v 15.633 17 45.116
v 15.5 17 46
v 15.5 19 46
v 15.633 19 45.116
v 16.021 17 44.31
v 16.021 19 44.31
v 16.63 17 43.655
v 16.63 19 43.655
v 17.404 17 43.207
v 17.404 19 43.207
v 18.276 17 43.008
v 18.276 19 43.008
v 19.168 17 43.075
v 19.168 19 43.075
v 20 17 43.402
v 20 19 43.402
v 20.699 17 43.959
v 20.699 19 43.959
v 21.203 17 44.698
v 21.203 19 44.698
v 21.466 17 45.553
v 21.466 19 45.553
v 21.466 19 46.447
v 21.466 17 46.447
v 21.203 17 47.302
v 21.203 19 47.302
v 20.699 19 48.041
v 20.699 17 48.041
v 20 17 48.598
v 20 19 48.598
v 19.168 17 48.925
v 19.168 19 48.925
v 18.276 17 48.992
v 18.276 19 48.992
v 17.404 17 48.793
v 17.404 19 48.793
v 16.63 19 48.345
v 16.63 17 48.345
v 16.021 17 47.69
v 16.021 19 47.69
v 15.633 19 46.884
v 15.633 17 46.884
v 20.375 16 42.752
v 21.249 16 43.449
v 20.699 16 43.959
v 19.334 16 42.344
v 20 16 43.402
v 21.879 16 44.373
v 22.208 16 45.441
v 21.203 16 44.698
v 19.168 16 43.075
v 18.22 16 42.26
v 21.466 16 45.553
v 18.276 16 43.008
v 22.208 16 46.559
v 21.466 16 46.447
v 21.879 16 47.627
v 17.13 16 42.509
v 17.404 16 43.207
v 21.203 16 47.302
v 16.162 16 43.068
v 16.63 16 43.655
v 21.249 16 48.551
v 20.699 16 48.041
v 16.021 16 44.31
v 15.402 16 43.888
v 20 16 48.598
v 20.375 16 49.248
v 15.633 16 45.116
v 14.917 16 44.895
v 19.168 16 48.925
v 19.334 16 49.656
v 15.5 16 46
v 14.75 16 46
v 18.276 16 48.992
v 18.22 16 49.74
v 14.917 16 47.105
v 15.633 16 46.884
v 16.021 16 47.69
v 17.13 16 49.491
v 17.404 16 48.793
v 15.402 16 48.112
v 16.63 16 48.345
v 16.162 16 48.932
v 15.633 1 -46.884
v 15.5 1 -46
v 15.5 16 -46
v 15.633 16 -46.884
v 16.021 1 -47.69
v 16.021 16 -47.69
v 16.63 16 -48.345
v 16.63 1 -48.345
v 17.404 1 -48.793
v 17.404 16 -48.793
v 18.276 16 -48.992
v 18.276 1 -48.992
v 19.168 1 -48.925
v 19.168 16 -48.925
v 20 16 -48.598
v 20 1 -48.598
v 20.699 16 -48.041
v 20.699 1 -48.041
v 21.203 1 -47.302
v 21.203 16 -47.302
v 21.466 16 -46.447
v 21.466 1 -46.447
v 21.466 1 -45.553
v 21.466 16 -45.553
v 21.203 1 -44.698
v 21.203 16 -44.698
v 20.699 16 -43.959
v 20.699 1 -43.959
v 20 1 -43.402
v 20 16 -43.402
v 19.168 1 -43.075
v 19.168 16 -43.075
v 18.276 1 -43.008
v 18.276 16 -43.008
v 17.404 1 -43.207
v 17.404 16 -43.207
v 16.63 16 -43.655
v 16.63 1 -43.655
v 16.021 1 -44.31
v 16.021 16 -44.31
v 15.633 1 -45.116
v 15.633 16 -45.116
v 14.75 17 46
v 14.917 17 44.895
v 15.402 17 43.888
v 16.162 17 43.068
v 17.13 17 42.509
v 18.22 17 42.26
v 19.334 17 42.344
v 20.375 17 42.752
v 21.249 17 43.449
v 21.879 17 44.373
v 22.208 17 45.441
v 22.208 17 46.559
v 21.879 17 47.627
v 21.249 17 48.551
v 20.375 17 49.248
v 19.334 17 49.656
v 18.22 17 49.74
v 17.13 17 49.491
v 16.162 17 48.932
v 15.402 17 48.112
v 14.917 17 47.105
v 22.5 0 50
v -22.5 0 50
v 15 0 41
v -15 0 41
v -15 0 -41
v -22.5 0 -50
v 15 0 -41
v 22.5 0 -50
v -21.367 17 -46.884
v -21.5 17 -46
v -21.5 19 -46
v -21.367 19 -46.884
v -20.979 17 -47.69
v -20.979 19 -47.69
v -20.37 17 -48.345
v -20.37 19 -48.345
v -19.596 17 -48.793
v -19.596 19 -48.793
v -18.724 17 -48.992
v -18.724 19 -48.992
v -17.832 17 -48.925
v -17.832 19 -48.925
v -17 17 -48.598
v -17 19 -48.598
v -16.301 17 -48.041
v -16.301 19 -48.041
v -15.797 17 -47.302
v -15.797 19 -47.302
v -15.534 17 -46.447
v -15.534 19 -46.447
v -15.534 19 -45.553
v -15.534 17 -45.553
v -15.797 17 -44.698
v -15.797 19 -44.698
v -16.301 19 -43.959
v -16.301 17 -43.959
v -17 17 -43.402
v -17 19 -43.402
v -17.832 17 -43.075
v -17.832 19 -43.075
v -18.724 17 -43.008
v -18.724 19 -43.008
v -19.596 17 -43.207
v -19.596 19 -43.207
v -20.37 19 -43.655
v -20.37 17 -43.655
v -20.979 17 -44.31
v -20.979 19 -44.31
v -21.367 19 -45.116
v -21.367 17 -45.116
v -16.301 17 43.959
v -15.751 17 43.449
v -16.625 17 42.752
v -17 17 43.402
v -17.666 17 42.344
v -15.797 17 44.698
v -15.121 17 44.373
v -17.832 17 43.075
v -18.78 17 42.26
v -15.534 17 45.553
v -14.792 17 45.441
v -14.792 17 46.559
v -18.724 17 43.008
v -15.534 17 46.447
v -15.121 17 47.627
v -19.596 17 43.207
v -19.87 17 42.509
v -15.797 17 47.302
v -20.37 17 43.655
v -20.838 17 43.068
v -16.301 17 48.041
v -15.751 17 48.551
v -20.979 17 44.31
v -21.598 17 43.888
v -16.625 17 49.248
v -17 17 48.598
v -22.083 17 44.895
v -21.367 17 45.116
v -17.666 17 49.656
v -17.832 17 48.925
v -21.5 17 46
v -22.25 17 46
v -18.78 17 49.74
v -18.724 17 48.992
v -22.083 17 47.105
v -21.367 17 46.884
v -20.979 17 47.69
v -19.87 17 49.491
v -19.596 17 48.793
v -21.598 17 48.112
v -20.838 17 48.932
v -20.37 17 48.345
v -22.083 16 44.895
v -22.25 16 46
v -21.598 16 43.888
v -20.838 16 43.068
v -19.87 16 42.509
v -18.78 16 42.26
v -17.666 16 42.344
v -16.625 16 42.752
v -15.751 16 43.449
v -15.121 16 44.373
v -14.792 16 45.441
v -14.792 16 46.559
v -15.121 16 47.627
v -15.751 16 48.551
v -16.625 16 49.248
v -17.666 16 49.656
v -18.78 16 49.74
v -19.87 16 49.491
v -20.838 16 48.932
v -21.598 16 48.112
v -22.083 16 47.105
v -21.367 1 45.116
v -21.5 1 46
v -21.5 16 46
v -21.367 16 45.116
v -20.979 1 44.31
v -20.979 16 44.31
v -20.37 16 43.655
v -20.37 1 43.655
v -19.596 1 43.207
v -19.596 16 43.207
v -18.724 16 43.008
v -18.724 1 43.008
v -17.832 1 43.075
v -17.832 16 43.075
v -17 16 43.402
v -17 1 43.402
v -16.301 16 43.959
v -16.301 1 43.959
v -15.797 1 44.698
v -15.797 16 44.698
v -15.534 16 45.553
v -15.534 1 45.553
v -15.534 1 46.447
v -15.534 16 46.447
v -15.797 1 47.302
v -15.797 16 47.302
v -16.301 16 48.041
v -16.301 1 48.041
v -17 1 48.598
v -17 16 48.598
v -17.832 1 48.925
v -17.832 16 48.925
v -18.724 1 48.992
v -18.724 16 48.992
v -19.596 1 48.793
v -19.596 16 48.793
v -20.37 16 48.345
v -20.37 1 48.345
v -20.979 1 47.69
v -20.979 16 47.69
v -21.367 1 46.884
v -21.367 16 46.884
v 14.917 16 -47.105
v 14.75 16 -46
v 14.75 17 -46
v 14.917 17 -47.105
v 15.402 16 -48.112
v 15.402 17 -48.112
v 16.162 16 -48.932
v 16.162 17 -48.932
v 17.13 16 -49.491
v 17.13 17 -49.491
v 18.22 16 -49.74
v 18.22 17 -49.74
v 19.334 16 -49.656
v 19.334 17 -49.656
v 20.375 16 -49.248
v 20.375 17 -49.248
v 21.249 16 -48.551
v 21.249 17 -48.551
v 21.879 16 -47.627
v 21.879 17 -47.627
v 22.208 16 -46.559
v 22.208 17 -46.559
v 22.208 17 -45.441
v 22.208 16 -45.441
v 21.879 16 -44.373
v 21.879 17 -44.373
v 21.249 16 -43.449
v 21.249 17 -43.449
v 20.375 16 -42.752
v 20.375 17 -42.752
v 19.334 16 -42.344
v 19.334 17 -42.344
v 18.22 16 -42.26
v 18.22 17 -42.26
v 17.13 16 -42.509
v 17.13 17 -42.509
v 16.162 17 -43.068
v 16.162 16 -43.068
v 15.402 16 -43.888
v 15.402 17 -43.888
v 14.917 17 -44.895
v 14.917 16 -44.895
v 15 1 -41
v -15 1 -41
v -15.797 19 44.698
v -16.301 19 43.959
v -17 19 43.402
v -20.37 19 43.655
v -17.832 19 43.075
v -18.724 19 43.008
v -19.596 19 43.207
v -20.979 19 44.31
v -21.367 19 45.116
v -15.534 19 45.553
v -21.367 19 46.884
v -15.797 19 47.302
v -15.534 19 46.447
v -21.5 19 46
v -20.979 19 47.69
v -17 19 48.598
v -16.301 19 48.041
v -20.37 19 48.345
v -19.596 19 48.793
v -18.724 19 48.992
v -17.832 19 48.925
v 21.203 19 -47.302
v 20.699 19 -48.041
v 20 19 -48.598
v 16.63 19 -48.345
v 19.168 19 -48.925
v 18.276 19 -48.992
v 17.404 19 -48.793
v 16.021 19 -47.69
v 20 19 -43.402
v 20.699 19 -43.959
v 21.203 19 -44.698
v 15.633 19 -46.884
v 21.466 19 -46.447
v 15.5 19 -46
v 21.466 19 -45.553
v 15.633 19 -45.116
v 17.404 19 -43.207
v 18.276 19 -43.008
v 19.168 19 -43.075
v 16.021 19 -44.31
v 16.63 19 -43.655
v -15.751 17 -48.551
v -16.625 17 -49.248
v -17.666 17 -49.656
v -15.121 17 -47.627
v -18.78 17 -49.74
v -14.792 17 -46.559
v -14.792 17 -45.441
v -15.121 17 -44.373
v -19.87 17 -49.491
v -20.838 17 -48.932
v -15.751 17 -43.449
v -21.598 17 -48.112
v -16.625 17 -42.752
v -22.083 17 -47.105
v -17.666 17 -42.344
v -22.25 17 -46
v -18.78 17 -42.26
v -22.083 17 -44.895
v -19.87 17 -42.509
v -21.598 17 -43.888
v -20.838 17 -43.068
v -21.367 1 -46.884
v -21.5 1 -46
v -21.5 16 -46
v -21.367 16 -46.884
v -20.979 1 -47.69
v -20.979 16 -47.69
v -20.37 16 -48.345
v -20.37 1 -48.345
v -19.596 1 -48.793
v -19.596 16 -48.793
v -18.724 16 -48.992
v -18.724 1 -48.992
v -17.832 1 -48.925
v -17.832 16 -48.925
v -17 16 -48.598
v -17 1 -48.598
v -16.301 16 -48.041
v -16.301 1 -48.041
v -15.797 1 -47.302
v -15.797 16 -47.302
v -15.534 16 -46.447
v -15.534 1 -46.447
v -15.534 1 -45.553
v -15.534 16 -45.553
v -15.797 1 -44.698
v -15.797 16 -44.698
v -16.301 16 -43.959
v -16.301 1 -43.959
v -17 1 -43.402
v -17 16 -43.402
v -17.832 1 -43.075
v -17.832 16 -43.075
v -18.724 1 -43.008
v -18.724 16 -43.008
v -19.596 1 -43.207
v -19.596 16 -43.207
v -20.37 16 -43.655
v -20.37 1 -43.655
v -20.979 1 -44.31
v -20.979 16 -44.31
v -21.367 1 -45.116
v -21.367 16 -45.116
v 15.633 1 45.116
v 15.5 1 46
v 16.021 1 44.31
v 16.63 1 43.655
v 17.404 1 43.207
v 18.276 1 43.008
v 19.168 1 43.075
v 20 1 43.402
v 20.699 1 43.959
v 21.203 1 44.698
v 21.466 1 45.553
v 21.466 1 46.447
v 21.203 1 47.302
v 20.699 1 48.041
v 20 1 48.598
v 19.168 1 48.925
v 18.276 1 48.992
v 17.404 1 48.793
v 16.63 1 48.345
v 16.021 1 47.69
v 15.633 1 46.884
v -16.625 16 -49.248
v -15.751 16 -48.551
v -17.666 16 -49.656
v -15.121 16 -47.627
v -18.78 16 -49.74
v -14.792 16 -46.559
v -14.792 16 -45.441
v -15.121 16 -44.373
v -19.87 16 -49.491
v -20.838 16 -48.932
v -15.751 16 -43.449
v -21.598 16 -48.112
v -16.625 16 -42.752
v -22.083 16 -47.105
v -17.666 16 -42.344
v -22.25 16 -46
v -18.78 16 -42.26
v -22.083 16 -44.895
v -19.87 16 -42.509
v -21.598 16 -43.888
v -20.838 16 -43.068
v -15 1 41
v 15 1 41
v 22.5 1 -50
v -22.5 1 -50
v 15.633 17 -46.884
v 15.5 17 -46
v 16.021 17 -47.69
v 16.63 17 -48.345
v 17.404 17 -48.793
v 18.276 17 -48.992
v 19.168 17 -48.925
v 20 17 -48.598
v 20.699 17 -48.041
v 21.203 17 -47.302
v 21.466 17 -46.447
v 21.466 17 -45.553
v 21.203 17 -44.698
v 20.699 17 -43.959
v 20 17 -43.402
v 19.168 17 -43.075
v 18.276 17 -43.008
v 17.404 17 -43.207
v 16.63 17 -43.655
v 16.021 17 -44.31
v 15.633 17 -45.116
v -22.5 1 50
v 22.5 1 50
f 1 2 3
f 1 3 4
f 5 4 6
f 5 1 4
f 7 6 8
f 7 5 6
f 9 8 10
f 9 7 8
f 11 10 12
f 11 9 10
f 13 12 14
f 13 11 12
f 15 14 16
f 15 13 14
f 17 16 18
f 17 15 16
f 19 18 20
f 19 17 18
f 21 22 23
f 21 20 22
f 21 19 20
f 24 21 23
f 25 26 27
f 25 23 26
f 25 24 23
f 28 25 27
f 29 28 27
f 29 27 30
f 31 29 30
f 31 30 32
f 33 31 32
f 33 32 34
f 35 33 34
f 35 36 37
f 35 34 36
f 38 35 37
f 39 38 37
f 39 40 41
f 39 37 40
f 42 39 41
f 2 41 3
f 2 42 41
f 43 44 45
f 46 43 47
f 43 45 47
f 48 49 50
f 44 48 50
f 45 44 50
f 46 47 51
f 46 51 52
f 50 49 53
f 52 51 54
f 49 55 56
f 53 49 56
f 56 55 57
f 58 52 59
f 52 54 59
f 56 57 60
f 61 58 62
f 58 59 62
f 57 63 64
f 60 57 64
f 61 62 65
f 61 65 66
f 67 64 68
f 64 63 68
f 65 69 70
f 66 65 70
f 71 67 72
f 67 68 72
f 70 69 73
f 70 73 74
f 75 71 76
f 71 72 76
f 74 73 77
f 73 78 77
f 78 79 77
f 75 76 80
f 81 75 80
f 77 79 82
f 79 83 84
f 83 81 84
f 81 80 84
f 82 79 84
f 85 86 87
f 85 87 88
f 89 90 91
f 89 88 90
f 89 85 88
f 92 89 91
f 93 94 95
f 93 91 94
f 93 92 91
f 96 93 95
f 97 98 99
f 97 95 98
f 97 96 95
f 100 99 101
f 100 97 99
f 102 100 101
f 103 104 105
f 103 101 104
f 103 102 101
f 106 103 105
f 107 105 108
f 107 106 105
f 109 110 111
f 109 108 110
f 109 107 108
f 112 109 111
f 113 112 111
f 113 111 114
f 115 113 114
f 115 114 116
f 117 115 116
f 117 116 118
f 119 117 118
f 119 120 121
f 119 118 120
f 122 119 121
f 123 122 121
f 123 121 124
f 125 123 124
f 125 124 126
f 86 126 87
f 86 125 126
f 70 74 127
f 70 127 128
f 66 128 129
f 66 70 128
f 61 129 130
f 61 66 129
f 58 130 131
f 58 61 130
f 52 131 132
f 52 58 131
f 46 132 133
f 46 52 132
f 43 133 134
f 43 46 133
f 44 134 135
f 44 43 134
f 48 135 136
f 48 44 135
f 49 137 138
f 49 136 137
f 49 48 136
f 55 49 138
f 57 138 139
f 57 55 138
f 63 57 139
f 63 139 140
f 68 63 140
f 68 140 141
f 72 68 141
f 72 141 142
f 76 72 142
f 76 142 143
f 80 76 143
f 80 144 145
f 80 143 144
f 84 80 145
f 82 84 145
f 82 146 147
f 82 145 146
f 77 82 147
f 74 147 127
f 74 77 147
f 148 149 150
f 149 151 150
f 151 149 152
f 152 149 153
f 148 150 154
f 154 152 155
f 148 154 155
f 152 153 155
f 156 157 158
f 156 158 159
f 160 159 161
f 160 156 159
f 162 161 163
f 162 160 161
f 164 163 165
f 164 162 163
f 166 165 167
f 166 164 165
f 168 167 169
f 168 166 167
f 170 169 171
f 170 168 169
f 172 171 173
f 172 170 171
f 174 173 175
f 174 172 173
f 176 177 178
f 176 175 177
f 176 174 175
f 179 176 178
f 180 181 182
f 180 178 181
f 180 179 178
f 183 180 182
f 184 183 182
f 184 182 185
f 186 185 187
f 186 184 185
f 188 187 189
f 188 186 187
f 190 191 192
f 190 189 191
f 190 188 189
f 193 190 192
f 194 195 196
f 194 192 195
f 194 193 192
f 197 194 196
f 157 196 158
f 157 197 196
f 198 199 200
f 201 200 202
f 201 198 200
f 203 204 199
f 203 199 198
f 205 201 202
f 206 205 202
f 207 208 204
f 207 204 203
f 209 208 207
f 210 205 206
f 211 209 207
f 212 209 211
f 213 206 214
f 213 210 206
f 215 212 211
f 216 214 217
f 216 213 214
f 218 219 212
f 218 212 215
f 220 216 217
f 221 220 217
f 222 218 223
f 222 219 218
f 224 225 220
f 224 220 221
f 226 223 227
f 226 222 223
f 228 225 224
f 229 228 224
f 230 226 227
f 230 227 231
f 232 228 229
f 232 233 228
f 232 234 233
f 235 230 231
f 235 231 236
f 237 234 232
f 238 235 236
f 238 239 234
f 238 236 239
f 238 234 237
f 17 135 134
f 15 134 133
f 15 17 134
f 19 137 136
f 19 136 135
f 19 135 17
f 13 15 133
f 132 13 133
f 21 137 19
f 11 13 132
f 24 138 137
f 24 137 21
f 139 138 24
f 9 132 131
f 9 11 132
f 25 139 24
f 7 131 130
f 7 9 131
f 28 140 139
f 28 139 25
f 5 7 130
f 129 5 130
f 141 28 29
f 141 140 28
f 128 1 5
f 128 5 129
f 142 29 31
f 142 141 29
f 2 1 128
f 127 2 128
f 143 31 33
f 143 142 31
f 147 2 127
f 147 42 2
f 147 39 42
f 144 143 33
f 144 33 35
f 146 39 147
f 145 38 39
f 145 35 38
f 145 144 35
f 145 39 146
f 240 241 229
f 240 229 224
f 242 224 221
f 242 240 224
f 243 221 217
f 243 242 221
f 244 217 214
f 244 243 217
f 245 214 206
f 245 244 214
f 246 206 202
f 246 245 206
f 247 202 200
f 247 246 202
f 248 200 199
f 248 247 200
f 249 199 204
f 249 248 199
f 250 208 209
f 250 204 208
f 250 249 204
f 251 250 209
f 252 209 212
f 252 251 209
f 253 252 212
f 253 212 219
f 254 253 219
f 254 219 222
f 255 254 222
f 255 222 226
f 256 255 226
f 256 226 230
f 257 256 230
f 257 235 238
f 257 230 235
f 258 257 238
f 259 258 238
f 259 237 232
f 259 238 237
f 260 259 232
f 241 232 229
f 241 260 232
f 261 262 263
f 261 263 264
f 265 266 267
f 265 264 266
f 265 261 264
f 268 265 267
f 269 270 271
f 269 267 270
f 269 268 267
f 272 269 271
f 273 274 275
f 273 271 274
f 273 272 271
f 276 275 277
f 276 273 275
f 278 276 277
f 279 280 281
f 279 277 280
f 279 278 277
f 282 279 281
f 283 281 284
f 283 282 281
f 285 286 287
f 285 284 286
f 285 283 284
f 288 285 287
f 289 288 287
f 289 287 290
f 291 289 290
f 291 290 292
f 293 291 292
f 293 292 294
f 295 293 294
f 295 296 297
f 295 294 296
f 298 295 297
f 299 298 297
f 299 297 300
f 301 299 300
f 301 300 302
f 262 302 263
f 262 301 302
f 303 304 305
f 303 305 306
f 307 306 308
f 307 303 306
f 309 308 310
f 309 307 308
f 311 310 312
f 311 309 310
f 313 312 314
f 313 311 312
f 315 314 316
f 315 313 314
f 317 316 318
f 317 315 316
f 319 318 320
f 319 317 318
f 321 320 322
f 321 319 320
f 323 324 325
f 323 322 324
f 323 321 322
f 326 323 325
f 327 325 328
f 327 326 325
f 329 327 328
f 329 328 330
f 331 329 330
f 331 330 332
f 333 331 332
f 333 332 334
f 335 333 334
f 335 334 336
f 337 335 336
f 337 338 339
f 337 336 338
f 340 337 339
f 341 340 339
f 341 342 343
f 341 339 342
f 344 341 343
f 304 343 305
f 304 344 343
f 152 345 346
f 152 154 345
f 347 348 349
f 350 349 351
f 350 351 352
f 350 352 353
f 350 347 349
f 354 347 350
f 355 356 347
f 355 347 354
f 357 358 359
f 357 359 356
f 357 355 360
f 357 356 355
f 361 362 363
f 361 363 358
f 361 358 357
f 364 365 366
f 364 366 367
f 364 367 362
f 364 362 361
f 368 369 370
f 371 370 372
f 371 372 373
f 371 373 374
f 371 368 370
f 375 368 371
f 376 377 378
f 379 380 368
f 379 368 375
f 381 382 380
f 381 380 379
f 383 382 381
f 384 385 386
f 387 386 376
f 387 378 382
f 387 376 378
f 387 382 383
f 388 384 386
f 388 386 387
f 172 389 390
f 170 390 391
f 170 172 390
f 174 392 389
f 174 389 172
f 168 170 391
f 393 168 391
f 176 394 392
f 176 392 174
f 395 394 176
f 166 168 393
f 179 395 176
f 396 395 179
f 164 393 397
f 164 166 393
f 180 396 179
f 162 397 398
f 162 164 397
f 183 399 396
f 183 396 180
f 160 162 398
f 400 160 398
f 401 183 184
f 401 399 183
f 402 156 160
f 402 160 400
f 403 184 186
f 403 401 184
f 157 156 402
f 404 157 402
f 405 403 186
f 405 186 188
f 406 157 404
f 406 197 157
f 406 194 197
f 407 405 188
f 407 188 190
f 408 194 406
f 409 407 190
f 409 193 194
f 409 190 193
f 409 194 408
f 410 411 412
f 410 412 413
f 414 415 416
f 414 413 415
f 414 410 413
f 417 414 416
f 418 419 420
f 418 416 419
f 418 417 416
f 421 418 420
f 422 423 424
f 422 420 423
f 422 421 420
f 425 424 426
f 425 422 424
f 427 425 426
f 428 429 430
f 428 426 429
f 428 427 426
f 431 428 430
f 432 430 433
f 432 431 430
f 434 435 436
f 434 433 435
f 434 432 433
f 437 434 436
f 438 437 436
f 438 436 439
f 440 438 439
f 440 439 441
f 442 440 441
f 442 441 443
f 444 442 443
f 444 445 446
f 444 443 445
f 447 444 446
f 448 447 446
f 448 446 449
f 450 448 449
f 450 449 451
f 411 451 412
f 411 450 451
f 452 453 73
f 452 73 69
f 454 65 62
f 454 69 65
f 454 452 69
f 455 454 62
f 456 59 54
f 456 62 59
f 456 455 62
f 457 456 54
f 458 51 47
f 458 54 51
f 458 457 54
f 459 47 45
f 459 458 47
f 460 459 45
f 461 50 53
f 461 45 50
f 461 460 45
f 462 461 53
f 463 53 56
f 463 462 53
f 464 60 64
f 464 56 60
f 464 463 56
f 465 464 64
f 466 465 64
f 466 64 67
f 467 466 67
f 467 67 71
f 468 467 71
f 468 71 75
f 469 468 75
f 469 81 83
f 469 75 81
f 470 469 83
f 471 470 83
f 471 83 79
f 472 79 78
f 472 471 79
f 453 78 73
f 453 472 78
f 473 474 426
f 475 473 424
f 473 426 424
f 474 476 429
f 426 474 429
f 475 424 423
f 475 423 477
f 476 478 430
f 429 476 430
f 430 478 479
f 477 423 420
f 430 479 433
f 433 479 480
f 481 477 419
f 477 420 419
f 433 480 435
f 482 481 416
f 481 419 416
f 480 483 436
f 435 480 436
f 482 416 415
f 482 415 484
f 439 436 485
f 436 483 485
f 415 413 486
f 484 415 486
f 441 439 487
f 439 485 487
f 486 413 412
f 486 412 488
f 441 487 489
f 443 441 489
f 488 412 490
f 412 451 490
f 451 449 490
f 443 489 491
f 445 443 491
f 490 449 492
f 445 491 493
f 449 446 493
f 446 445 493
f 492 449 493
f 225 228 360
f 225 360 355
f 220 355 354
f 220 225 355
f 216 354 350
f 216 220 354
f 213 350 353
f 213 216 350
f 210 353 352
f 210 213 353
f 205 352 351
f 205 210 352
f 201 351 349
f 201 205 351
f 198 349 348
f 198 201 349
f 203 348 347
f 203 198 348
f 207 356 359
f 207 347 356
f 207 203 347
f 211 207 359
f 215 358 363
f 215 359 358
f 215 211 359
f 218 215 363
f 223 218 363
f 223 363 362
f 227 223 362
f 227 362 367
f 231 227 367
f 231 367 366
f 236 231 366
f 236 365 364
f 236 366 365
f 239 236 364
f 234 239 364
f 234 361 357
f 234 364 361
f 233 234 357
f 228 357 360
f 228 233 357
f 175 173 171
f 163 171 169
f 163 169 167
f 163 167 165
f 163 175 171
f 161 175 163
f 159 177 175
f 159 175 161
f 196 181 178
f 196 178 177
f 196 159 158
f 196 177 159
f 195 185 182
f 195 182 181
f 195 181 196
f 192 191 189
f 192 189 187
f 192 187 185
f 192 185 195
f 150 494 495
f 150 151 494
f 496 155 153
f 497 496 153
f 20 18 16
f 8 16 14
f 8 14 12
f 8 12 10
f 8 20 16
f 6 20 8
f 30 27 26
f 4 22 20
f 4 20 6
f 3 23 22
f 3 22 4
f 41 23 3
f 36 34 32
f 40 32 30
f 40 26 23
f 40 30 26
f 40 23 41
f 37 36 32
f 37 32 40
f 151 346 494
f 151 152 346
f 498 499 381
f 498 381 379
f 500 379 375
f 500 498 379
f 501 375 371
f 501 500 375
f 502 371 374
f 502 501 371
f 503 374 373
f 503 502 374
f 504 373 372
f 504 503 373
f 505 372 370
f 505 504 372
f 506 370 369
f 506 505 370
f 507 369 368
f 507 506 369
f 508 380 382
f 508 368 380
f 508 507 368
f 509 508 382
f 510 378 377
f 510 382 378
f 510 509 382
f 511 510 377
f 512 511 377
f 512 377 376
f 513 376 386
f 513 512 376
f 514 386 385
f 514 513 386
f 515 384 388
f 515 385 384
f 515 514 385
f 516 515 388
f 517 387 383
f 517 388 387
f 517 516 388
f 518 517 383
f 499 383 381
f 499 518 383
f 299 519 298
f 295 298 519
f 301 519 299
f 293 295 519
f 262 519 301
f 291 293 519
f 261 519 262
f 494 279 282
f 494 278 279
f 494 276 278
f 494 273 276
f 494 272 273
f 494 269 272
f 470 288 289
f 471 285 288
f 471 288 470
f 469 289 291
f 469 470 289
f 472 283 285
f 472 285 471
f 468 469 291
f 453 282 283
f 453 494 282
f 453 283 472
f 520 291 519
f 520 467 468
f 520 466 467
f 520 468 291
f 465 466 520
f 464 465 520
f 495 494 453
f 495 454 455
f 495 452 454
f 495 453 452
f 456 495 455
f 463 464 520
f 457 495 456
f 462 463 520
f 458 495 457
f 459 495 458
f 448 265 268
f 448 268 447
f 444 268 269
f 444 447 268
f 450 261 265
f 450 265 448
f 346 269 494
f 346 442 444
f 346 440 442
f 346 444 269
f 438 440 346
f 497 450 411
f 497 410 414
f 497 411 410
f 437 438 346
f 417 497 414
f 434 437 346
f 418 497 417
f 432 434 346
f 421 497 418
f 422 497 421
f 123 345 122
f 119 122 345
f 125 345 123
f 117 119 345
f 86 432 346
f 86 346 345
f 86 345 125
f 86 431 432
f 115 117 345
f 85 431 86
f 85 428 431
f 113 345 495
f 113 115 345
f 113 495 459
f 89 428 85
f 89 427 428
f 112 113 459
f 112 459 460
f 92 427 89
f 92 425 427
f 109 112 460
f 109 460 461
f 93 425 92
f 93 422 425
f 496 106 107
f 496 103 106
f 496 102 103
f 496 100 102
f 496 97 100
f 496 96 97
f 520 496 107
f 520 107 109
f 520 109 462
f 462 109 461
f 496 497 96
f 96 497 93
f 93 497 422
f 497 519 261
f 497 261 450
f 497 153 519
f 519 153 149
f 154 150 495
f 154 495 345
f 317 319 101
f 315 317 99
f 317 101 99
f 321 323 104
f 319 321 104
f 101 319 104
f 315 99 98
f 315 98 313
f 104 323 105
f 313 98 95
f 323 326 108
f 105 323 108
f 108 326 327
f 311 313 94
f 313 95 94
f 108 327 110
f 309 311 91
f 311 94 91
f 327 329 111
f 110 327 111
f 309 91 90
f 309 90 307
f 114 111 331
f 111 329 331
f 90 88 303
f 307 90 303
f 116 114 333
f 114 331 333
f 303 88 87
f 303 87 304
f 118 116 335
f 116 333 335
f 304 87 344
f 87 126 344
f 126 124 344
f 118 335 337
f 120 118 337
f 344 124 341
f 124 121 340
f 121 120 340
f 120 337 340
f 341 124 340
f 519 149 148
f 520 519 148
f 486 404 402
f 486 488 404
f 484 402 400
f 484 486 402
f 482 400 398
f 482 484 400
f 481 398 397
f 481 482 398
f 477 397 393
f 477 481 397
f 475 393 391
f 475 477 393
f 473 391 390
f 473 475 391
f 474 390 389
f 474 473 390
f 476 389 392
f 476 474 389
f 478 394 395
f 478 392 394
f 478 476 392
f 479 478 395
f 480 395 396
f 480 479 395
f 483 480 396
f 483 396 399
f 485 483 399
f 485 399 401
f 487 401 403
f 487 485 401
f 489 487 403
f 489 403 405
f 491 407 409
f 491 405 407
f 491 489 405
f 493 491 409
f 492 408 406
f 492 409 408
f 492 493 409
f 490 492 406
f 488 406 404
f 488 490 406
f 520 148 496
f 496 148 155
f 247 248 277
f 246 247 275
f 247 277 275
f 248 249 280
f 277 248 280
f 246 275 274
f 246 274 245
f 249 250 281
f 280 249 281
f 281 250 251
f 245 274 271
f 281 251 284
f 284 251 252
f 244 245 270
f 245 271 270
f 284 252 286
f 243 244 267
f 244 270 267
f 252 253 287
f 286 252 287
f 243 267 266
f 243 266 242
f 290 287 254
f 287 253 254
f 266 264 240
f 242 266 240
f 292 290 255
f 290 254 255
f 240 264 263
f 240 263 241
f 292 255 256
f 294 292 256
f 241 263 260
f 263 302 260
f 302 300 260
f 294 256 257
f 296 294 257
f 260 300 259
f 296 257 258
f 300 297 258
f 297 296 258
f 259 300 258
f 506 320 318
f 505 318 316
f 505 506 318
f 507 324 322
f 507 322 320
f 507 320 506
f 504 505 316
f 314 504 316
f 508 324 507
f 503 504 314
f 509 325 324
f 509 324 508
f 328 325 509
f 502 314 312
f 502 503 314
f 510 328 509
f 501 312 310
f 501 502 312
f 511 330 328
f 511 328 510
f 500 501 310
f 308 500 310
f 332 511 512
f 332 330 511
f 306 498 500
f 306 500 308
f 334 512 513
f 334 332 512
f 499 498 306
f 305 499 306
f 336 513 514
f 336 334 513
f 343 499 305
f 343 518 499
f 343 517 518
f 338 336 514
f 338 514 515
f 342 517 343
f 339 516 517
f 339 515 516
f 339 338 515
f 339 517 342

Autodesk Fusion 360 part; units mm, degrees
sketch "Sketch1" plane through (0, 0, 0) normal (0, 1, 0) x (1, 0, 0)
  line L0 (22.5, 50) -> (-22.5, 50)
  line L1 (-22.5, 50) -> (-22.5, -50)
  line L2 (-22.5, -50) -> (22.5, -50)
  line L3 (22.5, -50) -> (22.5, 50)
  line L4 (22.5, 50) -> (-22.5, -50) construction
  line L5 (-22.5, 50) -> (22.5, -50) construction
  line L6 (15, 41) -> (-15, 41)
  line L7 (-15, 41) -> (-15, -41)
  line L8 (-15, -41) -> (15, -41)
  line L9 (15, -41) -> (15, 41)
  line L10 (15, 41) -> (-15, -41) construction
  line L11 (-15, 41) -> (15, -41) construction
  dimension "d1" = 45
  dimension "d2" = 100
  dimension "d3" = 30
  dimension "d4" = 82
extrude "Extrude1" add sketch "Sketch1" along normal blind 1
sketch "Sketch2" plane through (0, 1, 0) normal (0, 1, 0) x (-1, 0, 0)
  line L0 (-15, -41) -> (-15, 41)
  line L1 (-15, 41) -> (15, 41)
  line L2 (15, 41) -> (15, -41)
  line L3 (15, -41) -> (-15, -41)
  line L4 (-22.5, 50) -> (-22.5, -50)
  line L5 (-22.5, -50) -> (22.5, -50)
  line L6 (22.5, -50) -> (22.5, 50)
  line L7 (22.5, 50) -> (-22.5, 50)
  circle A0 centre (18.5, -46) radius 3
  circle A1 centre (-18.5, -46) radius 3
  circle A2 centre (-18.5, 46) radius 3
  circle A3 centre (18.5, 46) radius 3
  dimension "d7" = 6
  dimension "d8" = 4
  dimension "d9" = 4
  dimension "d10" = 6
  dimension "d11" = 4
  dimension "d12" = 4
  dimension "d13" = 6
  dimension "d14" = 4
  dimension "d15" = 4
  dimension "d16" = 6
  dimension "d17" = 4
  dimension "d18" = 4
extrude "Extrude2" add sketch "Sketch2" along normal blind 15 contours A0 | A1 | A2 | A3
sketch "Sketch3" plane through (0, 16, 0) normal (0, 1, 0) x (-1, 0, 0)
  circle A0 centre (18.5, -46) radius 3
  circle A1 centre (18.5, -46) radius 3.75
  circle A2 centre (-18.5, -46) radius 3.75
  circle A3 centre (-18.5, -46) radius 3
  circle A4 centre (18.5, 46) radius 3.75
  circle A5 centre (18.5, 46) radius 3
  circle A6 centre (-18.5, 46) radius 3.75
  circle A7 centre (-18.5, 46) radius 3
  dimension "d21" = 7.5
  dimension "d22" = 7.5
  dimension "d23" = 7.5
  dimension "d24" = 7.5
extrude "Extrude3" add sketch "Sketch3" along normal blind 1 contours A0 | A1 | A2 | A3 | A4 | A5 | A6 | A7
sketch "Sketch4" plane through (0, 17, 0) normal (0, 1, 0) x (-1, 0, 0)
  circle A0 centre (-18.5, -46) radius 3.75
  circle A1 centre (-18.5, -46) radius 3
  circle A2 centre (18.5, -46) radius 3
  circle A3 centre (18.5, -46) radius 3.75
  circle A4 centre (-18.5, 46) radius 3
  circle A5 centre (-18.5, 46) radius 3.75
  circle A6 centre (18.5, 46) radius 3
  circle A7 centre (18.5, 46) radius 3.75
  dimension "d27" = 6
  dimension "d28" = 6
  dimension "d29" = 6
  dimension "d30" = 6
extrude "Extrude4" add sketch "Sketch4" along normal blind 2 contours A1 | A2 | A4 | A6
